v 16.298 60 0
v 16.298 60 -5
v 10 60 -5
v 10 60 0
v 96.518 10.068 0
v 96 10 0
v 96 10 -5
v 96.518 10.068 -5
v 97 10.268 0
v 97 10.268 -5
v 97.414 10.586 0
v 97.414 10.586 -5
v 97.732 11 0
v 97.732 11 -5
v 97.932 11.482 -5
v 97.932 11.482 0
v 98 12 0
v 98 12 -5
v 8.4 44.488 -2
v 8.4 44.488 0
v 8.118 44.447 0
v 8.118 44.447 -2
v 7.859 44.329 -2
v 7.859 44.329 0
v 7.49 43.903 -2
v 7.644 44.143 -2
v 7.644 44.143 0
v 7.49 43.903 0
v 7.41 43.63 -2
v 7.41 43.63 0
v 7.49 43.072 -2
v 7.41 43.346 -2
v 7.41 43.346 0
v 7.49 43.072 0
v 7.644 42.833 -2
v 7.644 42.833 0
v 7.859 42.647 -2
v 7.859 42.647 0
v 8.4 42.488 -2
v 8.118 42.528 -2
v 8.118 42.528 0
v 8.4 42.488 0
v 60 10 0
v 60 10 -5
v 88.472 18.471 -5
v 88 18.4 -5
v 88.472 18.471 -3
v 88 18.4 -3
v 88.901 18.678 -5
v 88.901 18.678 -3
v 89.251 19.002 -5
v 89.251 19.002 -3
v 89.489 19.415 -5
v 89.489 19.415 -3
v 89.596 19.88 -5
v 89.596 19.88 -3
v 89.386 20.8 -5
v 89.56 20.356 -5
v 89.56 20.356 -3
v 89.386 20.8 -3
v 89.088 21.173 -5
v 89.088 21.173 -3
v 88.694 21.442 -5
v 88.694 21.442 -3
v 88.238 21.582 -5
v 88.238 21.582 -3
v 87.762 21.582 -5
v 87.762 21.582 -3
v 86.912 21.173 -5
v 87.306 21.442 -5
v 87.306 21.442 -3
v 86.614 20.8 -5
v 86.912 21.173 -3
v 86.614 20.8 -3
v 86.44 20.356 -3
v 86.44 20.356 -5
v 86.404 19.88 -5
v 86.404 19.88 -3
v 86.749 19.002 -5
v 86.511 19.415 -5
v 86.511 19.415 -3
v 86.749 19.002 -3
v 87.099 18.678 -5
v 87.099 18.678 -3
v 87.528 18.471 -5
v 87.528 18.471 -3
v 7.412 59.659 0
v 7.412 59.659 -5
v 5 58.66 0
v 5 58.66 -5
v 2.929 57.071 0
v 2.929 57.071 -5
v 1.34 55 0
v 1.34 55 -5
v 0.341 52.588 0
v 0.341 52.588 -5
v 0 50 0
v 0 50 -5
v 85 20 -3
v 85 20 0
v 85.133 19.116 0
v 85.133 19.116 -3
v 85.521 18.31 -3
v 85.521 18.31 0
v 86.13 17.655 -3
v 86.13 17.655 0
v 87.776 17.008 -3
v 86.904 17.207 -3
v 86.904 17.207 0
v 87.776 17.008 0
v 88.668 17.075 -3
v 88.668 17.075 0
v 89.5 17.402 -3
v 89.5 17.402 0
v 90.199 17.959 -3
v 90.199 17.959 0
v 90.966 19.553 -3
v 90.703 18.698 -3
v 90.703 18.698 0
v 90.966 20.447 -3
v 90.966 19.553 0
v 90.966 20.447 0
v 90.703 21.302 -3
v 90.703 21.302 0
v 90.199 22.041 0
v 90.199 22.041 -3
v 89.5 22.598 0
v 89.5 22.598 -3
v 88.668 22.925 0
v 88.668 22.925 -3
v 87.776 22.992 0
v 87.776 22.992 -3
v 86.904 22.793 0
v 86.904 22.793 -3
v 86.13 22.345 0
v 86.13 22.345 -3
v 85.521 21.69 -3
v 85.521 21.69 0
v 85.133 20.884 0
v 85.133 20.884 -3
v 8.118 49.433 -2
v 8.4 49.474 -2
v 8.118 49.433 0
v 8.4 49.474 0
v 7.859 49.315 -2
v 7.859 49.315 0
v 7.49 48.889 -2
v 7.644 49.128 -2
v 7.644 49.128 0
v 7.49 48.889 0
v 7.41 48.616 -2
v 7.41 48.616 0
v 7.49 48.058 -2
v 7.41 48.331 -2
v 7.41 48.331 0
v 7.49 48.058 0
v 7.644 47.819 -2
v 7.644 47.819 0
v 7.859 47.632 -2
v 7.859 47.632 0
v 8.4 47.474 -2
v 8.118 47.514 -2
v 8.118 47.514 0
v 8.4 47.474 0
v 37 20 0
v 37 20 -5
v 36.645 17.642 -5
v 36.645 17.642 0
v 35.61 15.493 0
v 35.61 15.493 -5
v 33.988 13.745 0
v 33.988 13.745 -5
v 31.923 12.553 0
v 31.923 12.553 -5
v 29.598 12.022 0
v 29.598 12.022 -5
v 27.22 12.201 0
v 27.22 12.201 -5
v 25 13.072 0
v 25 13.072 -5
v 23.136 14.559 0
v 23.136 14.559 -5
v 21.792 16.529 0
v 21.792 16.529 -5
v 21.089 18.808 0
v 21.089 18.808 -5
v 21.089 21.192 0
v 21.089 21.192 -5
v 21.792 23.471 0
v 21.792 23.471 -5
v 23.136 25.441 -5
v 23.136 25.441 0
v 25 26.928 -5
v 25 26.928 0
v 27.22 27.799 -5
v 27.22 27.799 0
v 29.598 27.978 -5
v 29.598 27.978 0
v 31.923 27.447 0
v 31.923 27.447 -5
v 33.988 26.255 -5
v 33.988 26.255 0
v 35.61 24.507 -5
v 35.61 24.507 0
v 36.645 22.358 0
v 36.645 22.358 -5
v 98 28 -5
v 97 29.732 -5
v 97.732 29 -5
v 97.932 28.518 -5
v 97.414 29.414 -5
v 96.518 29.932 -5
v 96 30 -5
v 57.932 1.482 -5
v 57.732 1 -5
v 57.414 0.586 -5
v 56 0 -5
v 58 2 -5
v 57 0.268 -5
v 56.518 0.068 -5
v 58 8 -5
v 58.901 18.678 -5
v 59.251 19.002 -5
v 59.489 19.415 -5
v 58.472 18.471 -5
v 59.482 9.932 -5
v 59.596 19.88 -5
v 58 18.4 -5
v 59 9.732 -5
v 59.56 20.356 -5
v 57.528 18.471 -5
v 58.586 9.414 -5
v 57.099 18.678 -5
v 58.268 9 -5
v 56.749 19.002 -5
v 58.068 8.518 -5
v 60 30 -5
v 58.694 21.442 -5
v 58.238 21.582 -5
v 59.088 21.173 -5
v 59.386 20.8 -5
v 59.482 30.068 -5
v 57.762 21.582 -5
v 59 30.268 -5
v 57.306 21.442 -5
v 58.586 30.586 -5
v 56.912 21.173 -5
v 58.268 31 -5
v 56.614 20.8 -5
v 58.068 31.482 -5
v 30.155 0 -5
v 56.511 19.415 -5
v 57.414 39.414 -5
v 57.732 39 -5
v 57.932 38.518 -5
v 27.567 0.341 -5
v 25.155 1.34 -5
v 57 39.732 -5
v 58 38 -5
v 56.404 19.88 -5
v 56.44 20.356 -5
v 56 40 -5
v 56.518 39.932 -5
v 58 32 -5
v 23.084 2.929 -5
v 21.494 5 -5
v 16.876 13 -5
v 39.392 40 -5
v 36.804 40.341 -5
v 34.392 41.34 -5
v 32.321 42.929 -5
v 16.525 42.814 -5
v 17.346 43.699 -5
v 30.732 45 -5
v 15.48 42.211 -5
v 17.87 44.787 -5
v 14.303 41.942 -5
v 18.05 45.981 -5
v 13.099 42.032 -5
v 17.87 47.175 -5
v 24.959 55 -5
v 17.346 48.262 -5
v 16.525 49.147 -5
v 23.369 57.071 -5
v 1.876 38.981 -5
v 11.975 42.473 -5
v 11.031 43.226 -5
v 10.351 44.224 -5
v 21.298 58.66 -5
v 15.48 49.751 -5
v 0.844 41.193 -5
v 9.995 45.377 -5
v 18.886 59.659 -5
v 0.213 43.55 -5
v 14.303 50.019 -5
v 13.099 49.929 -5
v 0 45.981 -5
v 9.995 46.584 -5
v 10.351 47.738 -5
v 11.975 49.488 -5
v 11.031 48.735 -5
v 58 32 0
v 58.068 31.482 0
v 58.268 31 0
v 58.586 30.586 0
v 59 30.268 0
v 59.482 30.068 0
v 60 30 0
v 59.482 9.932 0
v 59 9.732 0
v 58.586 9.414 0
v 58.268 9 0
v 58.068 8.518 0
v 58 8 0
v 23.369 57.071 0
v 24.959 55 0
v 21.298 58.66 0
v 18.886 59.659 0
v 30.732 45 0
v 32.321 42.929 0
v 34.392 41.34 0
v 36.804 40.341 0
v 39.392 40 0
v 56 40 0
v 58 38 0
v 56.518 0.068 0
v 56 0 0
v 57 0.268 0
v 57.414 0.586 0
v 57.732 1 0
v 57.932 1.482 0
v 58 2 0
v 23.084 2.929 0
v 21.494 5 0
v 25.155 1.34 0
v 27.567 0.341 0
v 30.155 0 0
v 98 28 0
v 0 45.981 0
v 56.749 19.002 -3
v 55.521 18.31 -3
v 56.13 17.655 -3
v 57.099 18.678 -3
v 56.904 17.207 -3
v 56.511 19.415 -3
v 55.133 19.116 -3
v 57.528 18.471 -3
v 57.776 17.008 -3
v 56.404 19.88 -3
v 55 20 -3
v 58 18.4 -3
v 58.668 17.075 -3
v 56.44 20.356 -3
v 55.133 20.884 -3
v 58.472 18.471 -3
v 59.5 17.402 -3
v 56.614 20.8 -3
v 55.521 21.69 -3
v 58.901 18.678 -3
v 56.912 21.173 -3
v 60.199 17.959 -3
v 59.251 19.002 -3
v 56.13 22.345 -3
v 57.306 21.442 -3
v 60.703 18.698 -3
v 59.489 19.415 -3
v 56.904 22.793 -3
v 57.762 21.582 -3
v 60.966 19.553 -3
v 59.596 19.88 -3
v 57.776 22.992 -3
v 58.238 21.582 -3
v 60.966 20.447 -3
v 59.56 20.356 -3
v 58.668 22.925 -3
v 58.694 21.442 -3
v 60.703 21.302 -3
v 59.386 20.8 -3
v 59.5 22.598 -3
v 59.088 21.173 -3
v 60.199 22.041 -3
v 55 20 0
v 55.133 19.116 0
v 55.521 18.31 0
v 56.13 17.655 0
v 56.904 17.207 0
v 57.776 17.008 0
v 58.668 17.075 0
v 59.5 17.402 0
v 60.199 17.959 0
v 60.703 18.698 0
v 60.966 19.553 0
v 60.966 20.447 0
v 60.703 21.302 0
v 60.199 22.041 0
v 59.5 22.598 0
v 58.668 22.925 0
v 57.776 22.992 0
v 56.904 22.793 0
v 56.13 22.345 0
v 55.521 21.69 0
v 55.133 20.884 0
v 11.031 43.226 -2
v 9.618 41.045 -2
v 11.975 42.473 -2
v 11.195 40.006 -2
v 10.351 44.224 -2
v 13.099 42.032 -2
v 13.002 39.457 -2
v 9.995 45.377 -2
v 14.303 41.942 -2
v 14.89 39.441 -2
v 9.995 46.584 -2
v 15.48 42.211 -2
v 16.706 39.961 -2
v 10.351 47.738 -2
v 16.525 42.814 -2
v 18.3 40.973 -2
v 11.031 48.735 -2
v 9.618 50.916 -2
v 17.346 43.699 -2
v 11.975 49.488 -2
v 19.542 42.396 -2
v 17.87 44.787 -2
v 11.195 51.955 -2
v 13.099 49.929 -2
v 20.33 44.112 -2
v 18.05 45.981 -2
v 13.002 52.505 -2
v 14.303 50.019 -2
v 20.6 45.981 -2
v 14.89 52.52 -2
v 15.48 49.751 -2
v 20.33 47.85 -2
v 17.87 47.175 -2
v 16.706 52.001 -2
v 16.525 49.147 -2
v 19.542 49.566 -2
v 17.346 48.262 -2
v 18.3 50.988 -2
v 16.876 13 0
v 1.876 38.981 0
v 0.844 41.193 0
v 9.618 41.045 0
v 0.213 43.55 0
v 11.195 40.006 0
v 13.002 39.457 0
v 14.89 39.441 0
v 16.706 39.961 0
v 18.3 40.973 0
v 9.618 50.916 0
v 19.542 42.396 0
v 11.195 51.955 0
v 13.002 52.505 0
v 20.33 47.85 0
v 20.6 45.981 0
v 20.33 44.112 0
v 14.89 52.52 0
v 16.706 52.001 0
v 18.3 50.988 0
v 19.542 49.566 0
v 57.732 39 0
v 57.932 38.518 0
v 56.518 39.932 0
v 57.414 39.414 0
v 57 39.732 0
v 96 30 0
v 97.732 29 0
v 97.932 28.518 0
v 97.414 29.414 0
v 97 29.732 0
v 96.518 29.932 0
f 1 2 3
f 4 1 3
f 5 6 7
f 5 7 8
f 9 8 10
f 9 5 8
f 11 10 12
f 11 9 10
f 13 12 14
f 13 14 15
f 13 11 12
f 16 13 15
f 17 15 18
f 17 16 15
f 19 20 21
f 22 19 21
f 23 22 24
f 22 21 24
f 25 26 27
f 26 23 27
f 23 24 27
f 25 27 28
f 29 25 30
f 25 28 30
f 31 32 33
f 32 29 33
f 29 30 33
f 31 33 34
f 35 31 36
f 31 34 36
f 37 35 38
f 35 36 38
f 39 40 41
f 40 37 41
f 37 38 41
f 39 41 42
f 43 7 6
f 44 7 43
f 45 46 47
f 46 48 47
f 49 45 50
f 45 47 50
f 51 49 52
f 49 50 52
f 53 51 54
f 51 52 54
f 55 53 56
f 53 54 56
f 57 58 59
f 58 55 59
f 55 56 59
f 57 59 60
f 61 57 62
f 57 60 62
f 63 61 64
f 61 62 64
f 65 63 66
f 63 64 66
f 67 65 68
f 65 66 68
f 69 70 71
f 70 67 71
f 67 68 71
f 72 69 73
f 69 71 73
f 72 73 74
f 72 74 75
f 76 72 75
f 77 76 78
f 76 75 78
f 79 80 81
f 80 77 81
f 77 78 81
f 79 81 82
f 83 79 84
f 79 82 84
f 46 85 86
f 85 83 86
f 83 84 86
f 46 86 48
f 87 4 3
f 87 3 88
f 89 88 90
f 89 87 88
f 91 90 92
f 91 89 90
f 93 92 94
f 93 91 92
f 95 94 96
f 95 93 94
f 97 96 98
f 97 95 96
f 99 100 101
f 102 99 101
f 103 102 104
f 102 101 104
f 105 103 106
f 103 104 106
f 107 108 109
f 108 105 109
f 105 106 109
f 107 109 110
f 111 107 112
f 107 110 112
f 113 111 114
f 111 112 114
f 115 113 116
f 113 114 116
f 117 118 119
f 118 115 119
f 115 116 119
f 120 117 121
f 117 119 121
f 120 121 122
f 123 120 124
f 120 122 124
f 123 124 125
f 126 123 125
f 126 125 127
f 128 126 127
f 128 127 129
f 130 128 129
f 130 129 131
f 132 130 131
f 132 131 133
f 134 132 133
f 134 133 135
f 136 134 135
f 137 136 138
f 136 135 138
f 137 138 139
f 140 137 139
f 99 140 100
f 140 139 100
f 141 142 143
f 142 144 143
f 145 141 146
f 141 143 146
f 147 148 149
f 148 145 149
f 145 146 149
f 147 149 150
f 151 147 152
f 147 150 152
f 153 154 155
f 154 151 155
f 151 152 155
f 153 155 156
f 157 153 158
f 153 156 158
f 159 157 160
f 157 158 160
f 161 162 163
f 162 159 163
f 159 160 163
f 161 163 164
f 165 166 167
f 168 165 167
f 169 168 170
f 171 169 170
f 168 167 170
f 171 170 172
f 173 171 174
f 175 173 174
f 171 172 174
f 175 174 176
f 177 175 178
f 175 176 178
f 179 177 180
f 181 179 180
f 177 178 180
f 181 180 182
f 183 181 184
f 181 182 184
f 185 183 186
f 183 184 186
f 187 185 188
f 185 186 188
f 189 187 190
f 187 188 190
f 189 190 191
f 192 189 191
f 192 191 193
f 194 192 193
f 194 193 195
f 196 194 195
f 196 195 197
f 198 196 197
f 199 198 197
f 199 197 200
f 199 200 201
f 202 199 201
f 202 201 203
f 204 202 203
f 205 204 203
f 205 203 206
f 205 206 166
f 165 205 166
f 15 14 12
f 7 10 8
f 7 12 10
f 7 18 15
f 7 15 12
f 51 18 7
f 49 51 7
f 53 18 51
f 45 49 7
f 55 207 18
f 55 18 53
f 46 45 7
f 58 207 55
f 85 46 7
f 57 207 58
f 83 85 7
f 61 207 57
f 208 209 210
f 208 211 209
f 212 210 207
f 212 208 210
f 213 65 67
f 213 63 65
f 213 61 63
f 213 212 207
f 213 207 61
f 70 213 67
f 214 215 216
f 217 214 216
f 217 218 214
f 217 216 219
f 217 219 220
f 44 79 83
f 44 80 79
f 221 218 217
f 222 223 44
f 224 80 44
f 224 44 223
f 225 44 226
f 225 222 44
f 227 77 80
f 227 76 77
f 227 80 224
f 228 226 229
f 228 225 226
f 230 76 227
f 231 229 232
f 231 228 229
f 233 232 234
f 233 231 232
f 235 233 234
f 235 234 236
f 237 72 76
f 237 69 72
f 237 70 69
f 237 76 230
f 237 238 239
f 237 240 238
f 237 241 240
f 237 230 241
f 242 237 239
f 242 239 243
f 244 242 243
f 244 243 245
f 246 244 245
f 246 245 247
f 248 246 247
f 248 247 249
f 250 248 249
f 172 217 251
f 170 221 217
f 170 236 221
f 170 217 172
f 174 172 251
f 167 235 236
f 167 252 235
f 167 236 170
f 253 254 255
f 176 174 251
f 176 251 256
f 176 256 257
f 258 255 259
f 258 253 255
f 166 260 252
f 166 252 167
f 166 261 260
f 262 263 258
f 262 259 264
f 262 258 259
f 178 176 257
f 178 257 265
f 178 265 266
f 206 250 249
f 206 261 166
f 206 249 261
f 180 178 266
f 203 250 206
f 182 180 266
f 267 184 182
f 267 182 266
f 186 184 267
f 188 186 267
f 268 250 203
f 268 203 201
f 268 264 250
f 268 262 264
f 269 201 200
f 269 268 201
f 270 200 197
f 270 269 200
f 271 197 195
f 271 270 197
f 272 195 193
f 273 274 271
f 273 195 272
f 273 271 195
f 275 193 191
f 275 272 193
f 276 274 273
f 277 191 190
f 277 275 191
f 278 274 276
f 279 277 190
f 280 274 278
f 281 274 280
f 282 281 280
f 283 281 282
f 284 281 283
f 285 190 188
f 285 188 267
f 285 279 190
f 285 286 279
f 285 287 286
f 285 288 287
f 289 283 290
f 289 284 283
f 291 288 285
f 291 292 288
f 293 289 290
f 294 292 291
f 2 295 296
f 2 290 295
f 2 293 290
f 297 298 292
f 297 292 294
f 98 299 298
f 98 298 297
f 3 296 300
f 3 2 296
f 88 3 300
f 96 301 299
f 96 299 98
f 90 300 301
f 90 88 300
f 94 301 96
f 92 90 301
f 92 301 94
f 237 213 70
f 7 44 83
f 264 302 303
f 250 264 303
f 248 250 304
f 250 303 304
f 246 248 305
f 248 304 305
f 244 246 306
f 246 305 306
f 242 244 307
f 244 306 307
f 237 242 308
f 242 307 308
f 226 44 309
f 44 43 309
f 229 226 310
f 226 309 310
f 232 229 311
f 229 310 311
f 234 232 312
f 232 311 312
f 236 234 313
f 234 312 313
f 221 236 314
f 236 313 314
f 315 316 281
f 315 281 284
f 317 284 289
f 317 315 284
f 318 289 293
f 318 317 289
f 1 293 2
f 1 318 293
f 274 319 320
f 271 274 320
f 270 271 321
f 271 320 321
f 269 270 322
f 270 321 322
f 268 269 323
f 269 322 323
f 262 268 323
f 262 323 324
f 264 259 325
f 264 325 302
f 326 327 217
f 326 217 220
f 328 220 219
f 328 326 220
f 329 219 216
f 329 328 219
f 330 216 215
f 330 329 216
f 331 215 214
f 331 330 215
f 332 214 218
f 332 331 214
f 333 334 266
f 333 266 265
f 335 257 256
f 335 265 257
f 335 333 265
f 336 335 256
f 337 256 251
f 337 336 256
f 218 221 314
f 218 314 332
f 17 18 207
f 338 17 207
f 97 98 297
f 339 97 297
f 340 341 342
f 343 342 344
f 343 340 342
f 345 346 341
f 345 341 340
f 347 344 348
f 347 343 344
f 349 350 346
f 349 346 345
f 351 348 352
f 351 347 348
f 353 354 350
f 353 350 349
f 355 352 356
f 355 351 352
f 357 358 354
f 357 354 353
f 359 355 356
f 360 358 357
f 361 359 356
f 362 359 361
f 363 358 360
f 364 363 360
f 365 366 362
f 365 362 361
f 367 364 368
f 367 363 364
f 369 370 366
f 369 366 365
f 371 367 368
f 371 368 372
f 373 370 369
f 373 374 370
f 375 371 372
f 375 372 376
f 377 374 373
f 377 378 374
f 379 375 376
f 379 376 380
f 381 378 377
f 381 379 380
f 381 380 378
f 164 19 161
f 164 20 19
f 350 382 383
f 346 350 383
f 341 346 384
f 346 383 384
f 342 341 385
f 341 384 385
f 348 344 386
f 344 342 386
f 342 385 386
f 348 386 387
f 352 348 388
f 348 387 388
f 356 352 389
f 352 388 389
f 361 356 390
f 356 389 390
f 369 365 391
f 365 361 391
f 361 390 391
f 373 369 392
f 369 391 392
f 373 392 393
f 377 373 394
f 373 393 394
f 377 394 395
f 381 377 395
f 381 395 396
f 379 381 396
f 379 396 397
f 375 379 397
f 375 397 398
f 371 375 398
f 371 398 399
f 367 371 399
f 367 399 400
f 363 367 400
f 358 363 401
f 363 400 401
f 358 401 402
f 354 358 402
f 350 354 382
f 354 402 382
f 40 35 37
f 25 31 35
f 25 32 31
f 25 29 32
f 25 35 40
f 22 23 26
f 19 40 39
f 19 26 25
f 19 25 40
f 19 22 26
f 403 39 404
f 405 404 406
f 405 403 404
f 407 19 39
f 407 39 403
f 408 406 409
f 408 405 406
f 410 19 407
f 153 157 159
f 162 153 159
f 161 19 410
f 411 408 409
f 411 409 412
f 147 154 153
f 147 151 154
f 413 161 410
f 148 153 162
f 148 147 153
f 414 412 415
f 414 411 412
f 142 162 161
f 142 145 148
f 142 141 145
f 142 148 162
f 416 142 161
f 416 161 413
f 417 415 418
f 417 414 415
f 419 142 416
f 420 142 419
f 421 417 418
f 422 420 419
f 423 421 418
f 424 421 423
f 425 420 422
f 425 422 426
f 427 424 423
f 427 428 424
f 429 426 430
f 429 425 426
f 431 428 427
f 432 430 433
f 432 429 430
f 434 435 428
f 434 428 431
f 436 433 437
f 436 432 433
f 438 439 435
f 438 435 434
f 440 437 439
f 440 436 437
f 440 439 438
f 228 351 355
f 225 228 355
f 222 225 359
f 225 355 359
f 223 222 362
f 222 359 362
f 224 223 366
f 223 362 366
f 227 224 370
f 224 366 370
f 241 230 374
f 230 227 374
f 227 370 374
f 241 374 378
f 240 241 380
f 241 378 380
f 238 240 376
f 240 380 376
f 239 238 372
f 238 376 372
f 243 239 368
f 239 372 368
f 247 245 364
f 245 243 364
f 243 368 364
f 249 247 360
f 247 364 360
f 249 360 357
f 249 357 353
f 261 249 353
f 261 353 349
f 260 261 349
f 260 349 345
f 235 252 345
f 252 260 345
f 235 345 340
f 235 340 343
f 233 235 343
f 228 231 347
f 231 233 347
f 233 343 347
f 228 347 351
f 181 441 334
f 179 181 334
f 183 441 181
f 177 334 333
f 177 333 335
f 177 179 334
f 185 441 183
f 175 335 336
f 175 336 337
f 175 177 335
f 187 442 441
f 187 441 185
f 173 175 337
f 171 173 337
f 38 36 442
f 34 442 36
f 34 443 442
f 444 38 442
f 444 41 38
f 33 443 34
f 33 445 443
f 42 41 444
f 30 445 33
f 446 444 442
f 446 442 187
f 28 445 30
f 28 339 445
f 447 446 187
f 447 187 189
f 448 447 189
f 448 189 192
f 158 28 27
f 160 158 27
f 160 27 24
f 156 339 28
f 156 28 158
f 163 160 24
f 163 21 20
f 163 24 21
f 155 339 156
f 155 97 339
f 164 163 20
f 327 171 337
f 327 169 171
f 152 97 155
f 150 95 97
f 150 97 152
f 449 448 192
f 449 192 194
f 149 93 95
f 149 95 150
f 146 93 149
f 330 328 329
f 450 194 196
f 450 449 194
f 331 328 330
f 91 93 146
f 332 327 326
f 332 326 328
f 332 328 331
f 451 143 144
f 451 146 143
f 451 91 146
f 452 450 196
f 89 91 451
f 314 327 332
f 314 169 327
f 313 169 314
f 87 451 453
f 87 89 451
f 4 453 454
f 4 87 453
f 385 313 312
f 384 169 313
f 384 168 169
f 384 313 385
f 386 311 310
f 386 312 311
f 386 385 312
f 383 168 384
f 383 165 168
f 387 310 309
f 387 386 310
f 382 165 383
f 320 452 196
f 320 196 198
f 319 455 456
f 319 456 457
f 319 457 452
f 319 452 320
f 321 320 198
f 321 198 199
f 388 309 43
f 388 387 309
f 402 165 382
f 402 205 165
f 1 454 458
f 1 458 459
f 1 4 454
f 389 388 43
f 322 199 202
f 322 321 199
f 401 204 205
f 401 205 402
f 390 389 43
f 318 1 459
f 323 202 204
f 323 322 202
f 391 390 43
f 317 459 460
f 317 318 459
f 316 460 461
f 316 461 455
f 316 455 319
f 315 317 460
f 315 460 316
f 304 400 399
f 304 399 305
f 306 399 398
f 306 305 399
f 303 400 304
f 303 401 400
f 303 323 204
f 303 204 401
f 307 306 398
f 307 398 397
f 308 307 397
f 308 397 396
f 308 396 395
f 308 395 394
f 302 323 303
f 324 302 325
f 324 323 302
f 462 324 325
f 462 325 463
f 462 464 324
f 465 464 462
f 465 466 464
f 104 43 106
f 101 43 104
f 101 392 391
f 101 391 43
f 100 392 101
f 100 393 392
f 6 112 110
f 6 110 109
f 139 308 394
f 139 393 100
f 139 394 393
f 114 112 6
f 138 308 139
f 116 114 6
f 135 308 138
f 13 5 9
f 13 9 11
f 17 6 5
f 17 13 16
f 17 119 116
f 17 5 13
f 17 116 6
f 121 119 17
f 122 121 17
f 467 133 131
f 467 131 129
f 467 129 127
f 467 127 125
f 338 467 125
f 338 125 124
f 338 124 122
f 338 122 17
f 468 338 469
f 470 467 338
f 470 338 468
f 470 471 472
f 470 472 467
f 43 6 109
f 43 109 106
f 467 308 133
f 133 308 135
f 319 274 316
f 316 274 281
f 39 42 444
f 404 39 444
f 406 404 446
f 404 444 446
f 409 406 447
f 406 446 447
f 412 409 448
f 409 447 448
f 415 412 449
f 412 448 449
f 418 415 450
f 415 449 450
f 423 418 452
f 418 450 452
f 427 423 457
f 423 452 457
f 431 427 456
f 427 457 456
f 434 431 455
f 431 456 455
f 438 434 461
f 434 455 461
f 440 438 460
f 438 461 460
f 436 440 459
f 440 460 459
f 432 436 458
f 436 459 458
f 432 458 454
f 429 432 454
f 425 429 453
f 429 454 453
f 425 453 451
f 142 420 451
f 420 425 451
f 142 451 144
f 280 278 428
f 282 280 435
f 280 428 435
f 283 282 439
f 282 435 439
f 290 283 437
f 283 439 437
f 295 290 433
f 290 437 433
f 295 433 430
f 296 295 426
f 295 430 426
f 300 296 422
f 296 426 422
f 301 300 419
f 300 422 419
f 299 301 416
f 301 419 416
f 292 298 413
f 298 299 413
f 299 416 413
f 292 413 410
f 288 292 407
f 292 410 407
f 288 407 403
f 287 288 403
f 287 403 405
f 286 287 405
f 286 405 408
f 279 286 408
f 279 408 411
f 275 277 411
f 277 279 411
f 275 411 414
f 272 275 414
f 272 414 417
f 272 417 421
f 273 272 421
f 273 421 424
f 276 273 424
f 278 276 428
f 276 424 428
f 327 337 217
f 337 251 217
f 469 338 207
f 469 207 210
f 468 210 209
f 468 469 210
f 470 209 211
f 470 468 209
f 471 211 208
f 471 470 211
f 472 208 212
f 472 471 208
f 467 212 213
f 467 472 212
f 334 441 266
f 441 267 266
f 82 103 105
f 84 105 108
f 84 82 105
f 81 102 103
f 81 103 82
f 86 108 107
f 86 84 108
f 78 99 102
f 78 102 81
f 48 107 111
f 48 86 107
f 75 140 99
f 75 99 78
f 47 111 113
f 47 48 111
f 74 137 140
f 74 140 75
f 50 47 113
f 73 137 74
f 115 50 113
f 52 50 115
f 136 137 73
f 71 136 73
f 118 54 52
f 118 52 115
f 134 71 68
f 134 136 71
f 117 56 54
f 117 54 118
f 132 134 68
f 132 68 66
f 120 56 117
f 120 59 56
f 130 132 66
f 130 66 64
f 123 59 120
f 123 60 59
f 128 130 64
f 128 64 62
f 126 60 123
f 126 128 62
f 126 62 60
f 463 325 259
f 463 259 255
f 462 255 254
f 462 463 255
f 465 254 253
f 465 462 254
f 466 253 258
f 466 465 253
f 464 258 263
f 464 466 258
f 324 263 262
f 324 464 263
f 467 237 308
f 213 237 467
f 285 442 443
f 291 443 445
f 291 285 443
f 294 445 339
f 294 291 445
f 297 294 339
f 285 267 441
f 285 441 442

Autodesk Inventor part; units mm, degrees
ref_plane "YZ Plane" through (0, 0, 0) normal (1, 0, 0) x (0, 1, 0)
ref_plane "XZ Plane" through (0, 0, 0) normal (0, 1, 0) x (-1, 0, 0)
ref_plane "XY Plane" through (0, 0, 0) normal (0, 0, 1) x (1, 0, 0)
sketch "スケッチ1" plane through (0, 0, 0) normal (0, 0, 1) x (1, 0, 0)
  line L0 (0, 0) -> (98, 0)
  line L1 (98, 0) -> (98, 60)
  line L2 (98, 60) -> (0, 60)
  line L3 (0, 60) -> (0, 0)
  line L4 (98, 0) -> (29, 0)
  line L5 (29, 0) -> (29, 40)
  line L6 (29, 40) -> (98, 40)
  line L7 (98, 40) -> (98, 0)
  line L8 (29, 30) -> (98, 30)
  line L9 (98, 30) -> (98, 10)
  line L10 (98, 10) -> (29, 10)
  line L11 (29, 10) -> (29, 30)
  line L12 (98, 20) -> (0, 20)
  line L13 (29, 20) -> (5.906, 60)
  circle A0 centre (29, 20) radius 8
  circle A1 centre (14, 45.9808) radius 4.05
  line L14 (58, 40) -> (58, 0)
  line L15 (16.8756, 13) -> (-6.2184, 53)
  line L16 (41.1244, 27) -> (18.0303, 67)
  circle A2 centre (14, 45.9808) radius 14
  line L17 (16.8756, 13) -> (25.3526, -1.6825)
  point P0 (58, 30)
  point P1 (33.6188, 40)
  point P2 (22.0718, 60)
  point P3 (0, 45.9808)
  point P4 (1.8756, 38.9808)
  point P5 (24.3812, 0)
  point P6 (58, 0)
  point P7 (58, 10)
  dimension "d0" = 98
  dimension "d1" = 60
  dimension "d2" = 40
  dimension "d3" = 20
  dimension "d4" = 10
  dimension "d5" = 69
  dimension "d6" = 30
  dimension "d7" = 16
  dimension "d8" = 30
  dimension "d9" = 8.1
  dimension "d10" = 40
  dimension "d11" = 28
extrude "押し出し1" add sketch "スケッチ1" along normal blind 5 contours L5 L10 L14 L0 | L0 L17 L15 L12 A0 L5 | L5 A0 L12 L14 L10 | L14 L12 L1 L10 | L14 L8 L1 L12 | L12 A0 L5 L8 L14 | L15 A2 L13 A0 L12 | L8 L16 L6 L14 | A2 L13 A1 | A0 L13 A2 L16 L6 L5 | L8 L5 L6 L16 | L3 L2 L13 A2 | L13 A1 A2 | L13 L2 L16 A2
sketch "スケッチ2" plane through (0, 0, 5) normal (0, 0, 1) x (1, 0, 0)
  line L0 (98, 10) -> (98, 30) projected
  line L1 (98, 20) -> (47.1161, 20)
  point P0 (0, 0)
  point P1 (88, 20)
  point P2 (58, 20)
  dimension "d14" = 10
  dimension "d15" = 30
hole "穴1" at (88, 20, 5) at (58, 20, 5) direction (0, 0, -1) diameter 3.2 depth 10
fillet "フィレット1" radius 2 6 edges at (58, 40, 2.5) (58, 30, 2.5) (98, 30, 2.5) (98, 10, 2.5) (58, 0, 2.5) (58, 10, 2.5)
fillet "フィレット2" radius 10 4 edges at (24.3812, 0, 2.5) (0, 60, 2.5) (22.0718, 60, 2.5) (33.6188, 40, 2.5)
sketch "スケッチ5" plane through (0, 0, 0) normal (0, 0, -1) x (-1, 0, 0)
  circle A0 centre (-88, 20) radius 1.6 projected
  circle A1 centre (-88, 20) radius 3
  circle A2 centre (-58, 20) radius 1.6 projected
  circle A3 centre (-58, 20) radius 3
  point P0 (0, 0)
  dimension "d38" = 6
  dimension "d39" = 6
extrude "押し出し3" cut sketch "スケッチ5" against normal blind 3 contours A0 | A1 | A2 | A3
sketch "スケッチ6" plane through (0, 0, 0) normal (0, 0, -1) x (-1, 0, 0)
  circle A0 centre (-14, 45.9808) radius 4.05 projected
  circle A1 centre (-14, 45.9808) radius 6.6
  line L0 (-8.4, 49.4736) -> (-8.4, 42.4879)
  arc A2 (-8.4, 47.4736) -> (-8.4, 49.4736) centre (-8.4, 48.4736) ccw
  arc A3 (-8.4, 42.4879) -> (-8.4, 44.4879) centre (-8.4, 43.4879) ccw
  point P0 (0, 0)
  dimension "d42" = 13.2
  dimension "d45" = 5.6
  dimension "d46" = 1
  dimension "d47" = 0
  dimension "d48" = 0
  dimension "d49" = 1
extrude "押し出し4" cut sketch "スケッチ6" against normal blind 2 contours L0 A1 | A2 A1 | A1 A2 L0 | L0 A3 A1 | A1 A3
mirror "ミラー1" about plane through (0, 0, 0) normal (0, 0, 1)
sketch "スケッチ7" plane through (0, 0, 5) normal (0, 0, 1) x (1, 0, 0)
  line L0 (-28.9789, 82.3627) -> (120.5518, 82.3627)
  line L1 (120.5518, 82.3627) -> (120.5518, -18.8106)
  line L2 (120.5518, -18.8106) -> (-28.9789, -18.8106)
  line L3 (-28.9789, -18.8106) -> (-28.9789, 82.3627)
  point P0 (0, 0)
extrude "押し出し5" cut sketch "スケッチ7" against normal blind 5
equation "\"d49\" = d46"
properties part number "RP_Calf-Link-cover-Inside-Left"
